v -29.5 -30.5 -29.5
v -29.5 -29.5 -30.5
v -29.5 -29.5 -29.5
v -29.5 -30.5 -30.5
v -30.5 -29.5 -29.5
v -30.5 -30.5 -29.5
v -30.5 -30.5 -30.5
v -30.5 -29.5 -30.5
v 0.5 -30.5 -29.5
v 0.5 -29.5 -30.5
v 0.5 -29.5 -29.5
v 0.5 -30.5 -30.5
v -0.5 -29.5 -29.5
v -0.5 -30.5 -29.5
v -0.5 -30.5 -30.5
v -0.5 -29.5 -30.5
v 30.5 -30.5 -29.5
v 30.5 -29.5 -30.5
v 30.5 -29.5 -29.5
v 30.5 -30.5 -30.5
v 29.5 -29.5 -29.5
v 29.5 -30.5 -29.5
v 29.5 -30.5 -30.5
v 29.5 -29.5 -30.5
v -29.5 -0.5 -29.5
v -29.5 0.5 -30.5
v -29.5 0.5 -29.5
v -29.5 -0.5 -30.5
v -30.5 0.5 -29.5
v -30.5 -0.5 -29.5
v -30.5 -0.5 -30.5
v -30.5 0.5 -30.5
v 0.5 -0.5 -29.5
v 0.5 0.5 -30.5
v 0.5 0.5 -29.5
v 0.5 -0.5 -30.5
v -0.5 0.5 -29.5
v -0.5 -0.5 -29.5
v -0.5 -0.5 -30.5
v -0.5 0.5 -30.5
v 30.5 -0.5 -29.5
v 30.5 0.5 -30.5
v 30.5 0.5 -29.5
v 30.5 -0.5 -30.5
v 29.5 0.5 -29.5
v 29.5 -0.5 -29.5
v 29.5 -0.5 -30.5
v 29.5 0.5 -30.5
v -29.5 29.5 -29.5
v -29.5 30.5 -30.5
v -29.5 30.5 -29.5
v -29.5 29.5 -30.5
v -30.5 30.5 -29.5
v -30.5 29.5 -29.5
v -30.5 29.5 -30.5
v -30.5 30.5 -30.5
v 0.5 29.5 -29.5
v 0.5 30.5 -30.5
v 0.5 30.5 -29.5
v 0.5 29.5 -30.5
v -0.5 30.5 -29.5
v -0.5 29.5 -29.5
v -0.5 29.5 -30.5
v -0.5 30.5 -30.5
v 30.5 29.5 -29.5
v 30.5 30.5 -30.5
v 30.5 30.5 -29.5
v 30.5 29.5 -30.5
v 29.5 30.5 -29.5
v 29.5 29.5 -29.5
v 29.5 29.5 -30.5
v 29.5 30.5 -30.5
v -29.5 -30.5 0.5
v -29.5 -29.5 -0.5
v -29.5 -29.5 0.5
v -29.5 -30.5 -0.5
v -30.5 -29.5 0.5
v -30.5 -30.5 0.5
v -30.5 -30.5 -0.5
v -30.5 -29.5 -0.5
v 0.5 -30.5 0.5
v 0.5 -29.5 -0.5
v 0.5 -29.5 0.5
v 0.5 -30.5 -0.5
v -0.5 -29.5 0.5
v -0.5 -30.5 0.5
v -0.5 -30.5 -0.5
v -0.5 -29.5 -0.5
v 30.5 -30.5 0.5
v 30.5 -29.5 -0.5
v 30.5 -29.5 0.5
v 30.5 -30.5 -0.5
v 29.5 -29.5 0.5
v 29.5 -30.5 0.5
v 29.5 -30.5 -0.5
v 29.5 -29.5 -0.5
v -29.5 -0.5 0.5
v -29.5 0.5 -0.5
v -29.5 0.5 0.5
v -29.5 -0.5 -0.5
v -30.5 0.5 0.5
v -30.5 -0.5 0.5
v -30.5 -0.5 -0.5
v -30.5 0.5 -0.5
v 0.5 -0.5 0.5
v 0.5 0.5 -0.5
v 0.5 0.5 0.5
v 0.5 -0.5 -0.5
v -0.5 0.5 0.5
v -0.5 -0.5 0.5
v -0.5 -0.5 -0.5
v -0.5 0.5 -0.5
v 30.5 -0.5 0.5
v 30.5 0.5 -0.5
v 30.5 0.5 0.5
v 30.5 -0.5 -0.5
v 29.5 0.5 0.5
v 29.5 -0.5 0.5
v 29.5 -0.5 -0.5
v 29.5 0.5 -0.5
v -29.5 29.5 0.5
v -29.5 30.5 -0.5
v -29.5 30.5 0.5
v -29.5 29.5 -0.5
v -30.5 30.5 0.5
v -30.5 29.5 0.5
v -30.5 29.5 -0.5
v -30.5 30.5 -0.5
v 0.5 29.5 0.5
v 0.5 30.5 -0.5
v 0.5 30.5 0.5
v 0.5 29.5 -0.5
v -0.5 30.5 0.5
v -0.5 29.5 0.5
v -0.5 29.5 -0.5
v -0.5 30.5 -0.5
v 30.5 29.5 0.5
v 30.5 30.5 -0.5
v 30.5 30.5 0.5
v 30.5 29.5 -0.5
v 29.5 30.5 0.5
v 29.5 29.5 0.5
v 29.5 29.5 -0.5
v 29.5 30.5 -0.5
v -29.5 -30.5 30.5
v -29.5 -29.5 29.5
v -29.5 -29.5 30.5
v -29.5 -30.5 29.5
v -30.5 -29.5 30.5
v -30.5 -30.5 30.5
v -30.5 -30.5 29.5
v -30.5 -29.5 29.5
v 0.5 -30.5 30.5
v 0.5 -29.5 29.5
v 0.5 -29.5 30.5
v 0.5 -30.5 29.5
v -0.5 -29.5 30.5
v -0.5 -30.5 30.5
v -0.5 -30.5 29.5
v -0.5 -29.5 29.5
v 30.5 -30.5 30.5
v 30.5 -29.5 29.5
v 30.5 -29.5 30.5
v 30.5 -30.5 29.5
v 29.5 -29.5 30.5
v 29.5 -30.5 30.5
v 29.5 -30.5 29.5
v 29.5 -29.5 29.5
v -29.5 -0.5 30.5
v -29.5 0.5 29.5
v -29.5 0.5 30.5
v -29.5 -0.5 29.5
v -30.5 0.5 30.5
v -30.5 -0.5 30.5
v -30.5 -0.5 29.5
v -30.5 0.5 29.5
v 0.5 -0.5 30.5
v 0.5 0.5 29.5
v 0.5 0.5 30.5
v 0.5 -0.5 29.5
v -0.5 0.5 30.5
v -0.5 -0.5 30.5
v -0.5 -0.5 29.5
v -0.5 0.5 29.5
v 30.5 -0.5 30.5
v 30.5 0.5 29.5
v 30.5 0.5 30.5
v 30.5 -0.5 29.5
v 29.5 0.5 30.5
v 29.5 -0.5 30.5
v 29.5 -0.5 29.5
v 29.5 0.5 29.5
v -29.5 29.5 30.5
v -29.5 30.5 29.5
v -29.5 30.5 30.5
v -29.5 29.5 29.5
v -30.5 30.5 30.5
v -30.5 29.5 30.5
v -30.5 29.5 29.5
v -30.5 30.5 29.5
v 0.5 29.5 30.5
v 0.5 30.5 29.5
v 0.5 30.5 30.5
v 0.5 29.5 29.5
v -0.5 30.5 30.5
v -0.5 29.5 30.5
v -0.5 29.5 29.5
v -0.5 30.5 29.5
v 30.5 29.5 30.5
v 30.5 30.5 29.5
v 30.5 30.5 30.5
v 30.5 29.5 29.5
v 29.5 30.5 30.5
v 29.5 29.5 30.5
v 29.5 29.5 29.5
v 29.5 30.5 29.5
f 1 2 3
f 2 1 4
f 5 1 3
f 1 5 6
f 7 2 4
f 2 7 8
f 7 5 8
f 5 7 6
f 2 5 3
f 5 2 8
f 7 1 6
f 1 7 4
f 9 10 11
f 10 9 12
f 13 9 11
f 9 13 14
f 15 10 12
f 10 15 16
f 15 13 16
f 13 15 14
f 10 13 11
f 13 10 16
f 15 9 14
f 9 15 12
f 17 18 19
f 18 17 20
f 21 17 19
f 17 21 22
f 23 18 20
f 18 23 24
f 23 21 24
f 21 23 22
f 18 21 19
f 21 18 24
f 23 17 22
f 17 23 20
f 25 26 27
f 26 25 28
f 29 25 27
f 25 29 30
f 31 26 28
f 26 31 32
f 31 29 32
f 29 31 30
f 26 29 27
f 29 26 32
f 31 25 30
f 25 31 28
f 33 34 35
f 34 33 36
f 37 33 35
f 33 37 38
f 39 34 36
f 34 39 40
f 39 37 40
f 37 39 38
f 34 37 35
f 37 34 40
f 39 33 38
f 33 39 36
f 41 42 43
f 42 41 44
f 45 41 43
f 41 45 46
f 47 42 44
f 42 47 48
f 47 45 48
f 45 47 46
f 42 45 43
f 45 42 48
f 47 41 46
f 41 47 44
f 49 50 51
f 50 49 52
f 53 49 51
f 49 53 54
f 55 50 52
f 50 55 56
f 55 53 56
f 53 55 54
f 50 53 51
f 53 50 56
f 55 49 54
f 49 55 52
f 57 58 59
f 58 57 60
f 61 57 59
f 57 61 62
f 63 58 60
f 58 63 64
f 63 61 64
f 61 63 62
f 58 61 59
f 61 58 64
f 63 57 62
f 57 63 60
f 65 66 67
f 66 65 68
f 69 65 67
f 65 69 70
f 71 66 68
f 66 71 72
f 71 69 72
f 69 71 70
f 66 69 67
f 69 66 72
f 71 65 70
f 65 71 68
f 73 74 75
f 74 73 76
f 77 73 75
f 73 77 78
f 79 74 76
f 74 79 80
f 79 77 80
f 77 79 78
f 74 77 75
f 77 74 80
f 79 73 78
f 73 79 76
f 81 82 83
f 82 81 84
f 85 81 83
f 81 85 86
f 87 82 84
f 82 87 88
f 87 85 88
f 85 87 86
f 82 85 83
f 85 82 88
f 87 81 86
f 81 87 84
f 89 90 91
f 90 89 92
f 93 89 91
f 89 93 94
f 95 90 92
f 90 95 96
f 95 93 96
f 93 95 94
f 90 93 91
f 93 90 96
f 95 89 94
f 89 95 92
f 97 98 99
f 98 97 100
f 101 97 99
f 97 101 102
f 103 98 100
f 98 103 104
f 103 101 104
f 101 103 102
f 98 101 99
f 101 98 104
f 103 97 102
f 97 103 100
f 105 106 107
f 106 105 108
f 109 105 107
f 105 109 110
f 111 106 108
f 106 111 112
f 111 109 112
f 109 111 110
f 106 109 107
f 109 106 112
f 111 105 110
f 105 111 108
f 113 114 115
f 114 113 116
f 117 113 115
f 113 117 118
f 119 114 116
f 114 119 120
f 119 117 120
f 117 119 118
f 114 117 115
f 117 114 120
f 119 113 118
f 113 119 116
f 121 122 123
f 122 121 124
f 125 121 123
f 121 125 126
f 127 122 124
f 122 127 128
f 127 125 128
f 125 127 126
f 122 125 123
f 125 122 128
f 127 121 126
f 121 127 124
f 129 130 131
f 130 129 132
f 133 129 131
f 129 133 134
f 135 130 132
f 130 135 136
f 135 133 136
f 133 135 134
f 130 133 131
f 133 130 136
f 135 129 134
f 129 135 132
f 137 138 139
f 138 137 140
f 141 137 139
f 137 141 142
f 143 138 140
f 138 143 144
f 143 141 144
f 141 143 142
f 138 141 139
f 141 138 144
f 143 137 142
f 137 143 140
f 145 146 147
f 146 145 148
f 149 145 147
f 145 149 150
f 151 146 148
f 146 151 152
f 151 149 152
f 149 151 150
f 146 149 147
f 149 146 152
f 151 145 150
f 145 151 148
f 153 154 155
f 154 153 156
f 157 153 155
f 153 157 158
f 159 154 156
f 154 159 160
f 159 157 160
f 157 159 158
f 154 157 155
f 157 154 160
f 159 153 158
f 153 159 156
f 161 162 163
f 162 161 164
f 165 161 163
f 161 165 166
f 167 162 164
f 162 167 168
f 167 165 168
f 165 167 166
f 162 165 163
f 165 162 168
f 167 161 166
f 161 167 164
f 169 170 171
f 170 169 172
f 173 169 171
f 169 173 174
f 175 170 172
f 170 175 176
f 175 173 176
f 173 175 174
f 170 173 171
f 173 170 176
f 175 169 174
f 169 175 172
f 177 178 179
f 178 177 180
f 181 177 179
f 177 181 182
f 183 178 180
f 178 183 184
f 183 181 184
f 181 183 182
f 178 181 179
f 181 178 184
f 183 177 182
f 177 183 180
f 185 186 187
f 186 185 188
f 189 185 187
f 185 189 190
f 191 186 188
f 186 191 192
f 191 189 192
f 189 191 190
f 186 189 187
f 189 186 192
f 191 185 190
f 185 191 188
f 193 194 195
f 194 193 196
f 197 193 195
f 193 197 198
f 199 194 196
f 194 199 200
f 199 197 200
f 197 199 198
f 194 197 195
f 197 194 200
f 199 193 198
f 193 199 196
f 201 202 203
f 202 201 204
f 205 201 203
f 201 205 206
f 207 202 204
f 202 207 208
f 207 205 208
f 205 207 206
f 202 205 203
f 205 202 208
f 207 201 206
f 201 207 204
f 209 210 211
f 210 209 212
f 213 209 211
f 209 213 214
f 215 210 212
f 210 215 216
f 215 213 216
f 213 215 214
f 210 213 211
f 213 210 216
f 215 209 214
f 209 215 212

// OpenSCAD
// file: Pattern.scad
cube([2,2,2],true);

transform2([[1,2,0.25],[30,60,45],[5,5,5]])
cube([2,2,2],true);

pattern
(
[
[[1,1,1],[45,45,45],[3,3,3]],
[[2,2,2],[60,60,60],[8,8,8]]
]
)
cube([2,2,2],true);

hull_pattern
(
[
[[1,1,1],[0,0,0],[5,0,0]],
[[1,1,1],[0,0,0],[5,5,0]],
[[1,1,1],[0,0,0],[-5,5,0]],
[[1,1,1],[0,0,0],[-5,-5,0]],
[[1,1,1],[0,0,0],[5,-5,0]]
]
)
cylinder(r1=1,r2=1,h=5);

module transform(s, angle, displacement)
{
    translate(displacement)
    rotate([angle[0],0,0])
    rotate([0,angle[1],0])
    rotate([0,0,angle[2]])

    scale(s)
    children();
}

module transform2(t)
{
    transform(t[0],t[1],t[2])
    children();
}

///Duplicates an object in each specified place.
///p: The list of locations.
module pattern(p)
{
    for(x=p)
    {
        transform2(x)
        children();
    }
}

///Creates a convex hull between each pair of successive objects.
///p: The list of locations.
module hull_pattern(p)
{
    for(x=[0:len(p)-2])
    {
        hull()
        {
            transform2(p[x])
            children();
            transform2(p[x+1])
            children();
        }
    }
}

///Creates a convex hull between each pair of objects.
///p: The list of locations.
module web_pattern(p)
{
    for(x=[0:len(p)-2])
    {
        for(y=[x:len(p)-1])
        {
            hull()
            {
                transform2(p[x])
                children();
                transform2(p[y])
                children();
            }
        }
    }
}

function transformation(scaling,rotation,displacement)=[scaling,rotation,displacement];
// main file
use <Pattern.scad>

pattern(grid_volume([100,100,100],[30,30,30]))
cube([1,1,1],true);


function row(width,spacing,y,z)=
[for(x=[-(width-spacing-width%spacing)/2:spacing:(width-spacing-width%spacing)/2])     
[[1,1,1],[0,0,0],[x,y,z]]
];
    
function level(width, depth, x_spacing, y_spacing, z)=
[
for(y=[-(depth-y_spacing-depth%y_spacing)/2:y_spacing:(depth-y_spacing-depth%y_spacing)/2]) each row(width,x_spacing,y,z)
];

function grid_volume(dimensions,spacings)=
[
for(z=[-(dimensions[2]-spacings[2]-dimensions[2]%spacings[2])/2:spacings[2]:(dimensions[2]-spacings[2]-dimensions[2]%spacings[2])/2])
    each level(dimensions[0],dimensions[1],spacings[0],spacings[1],z)
];
